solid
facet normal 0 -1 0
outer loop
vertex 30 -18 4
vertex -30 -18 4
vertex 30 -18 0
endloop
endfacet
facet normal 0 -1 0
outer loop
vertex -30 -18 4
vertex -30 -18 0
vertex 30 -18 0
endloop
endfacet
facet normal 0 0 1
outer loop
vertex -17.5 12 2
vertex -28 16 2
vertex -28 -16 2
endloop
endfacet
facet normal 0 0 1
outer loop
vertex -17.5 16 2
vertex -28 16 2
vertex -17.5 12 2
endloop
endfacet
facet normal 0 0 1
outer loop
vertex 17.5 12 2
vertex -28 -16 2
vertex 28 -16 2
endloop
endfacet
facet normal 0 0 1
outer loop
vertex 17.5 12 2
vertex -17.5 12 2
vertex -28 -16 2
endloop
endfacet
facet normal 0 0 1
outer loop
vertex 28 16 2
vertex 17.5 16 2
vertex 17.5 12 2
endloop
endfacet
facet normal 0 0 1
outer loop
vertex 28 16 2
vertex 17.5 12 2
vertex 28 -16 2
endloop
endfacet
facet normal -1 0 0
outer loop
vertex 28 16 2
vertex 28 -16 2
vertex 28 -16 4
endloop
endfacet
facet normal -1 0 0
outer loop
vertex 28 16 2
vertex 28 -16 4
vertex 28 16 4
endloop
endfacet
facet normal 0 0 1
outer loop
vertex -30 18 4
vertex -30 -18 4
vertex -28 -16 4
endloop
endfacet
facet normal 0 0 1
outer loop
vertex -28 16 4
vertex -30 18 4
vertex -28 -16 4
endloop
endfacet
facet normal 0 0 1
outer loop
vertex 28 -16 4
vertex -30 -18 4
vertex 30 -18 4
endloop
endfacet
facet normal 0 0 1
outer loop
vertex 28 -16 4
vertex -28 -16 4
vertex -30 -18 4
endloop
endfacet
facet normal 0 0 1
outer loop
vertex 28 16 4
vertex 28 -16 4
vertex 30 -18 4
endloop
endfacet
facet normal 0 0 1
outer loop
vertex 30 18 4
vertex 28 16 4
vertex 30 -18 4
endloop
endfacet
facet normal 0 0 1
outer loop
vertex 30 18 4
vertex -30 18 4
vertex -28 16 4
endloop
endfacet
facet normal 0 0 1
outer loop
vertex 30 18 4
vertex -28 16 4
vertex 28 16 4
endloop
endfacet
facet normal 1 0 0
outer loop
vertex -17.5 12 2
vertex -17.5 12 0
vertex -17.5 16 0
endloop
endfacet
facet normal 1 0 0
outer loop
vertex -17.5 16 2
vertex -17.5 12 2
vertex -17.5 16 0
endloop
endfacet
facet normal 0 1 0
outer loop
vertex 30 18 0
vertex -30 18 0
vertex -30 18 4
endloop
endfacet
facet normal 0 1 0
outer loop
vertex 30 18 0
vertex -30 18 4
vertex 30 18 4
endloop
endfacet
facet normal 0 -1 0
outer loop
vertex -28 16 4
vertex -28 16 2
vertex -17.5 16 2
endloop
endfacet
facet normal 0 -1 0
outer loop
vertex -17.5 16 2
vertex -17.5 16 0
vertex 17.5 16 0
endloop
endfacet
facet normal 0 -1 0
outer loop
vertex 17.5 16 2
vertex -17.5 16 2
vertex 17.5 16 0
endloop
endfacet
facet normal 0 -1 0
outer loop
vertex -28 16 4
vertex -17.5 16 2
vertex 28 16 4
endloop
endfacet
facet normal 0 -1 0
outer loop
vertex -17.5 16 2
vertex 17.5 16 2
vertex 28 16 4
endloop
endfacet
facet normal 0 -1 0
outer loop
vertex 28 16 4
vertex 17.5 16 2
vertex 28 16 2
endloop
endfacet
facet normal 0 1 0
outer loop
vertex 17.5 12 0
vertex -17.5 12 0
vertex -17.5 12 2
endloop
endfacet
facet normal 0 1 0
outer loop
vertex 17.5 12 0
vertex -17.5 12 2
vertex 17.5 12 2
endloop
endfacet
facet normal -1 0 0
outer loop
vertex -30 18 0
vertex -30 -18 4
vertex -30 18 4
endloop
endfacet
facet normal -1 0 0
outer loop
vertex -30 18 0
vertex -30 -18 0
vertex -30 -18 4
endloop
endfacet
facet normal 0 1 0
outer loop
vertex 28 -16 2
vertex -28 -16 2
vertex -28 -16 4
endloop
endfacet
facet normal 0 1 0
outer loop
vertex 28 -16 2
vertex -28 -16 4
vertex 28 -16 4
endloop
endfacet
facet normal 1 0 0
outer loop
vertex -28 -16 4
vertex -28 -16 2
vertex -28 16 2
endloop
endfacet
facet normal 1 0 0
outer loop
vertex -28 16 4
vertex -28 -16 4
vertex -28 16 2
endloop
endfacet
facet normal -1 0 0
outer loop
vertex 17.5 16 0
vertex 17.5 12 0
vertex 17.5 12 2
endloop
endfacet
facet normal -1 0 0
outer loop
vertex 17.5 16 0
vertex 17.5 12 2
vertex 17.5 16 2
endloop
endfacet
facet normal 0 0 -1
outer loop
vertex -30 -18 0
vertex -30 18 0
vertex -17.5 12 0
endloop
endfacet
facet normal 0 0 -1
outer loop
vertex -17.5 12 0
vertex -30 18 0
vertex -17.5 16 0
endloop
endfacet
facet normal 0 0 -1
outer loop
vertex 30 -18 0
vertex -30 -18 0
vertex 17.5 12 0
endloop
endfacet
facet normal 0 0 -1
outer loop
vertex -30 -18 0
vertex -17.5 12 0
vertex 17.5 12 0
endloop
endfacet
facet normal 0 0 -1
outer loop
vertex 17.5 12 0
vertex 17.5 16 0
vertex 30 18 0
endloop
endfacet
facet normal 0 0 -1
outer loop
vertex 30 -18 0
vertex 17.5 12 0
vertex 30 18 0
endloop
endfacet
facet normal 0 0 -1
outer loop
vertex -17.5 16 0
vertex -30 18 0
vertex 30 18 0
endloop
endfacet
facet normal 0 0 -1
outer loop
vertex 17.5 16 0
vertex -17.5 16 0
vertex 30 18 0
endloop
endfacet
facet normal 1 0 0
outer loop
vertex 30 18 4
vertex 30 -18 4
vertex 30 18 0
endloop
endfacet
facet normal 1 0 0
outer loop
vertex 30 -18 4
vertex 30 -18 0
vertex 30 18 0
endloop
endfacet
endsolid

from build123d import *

# Parameters (mm, degrees)
SKETCH_1_W      = 60
SKETCH_1_H      = 36
SKETCH_1_W_2    = 35
SKETCH_1_H_2    = 4
EXTRUDE_1_DEPTH = 2
SKETCH_2_W      = 60
SKETCH_2_H      = 36
SKETCH_2_W_2    = 56
SKETCH_2_H_2    = 32
EXTRUDE_2_DEPTH = 2


with BuildPart() as part:
    # ｽｹｯﾁ1 → ﾎﾞｽ - 押し出し1 (new body)
    with BuildSketch(Plane.XY):
        Rectangle(SKETCH_1_W, SKETCH_1_H)
        with Locations((0, 14)):
            Rectangle(SKETCH_1_W_2, SKETCH_1_H_2, mode=Mode.SUBTRACT)
    extrude(amount=EXTRUDE_1_DEPTH)

    # ｽｹｯﾁ2 → ﾎﾞｽ - 押し出し2 (add)
    with BuildSketch(Plane.XY.offset(2)):
        Rectangle(SKETCH_2_W, SKETCH_2_H)
        Rectangle(SKETCH_2_W_2, SKETCH_2_H_2, mode=Mode.SUBTRACT)
    extrude(amount=EXTRUDE_2_DEPTH)


solid = part.part
